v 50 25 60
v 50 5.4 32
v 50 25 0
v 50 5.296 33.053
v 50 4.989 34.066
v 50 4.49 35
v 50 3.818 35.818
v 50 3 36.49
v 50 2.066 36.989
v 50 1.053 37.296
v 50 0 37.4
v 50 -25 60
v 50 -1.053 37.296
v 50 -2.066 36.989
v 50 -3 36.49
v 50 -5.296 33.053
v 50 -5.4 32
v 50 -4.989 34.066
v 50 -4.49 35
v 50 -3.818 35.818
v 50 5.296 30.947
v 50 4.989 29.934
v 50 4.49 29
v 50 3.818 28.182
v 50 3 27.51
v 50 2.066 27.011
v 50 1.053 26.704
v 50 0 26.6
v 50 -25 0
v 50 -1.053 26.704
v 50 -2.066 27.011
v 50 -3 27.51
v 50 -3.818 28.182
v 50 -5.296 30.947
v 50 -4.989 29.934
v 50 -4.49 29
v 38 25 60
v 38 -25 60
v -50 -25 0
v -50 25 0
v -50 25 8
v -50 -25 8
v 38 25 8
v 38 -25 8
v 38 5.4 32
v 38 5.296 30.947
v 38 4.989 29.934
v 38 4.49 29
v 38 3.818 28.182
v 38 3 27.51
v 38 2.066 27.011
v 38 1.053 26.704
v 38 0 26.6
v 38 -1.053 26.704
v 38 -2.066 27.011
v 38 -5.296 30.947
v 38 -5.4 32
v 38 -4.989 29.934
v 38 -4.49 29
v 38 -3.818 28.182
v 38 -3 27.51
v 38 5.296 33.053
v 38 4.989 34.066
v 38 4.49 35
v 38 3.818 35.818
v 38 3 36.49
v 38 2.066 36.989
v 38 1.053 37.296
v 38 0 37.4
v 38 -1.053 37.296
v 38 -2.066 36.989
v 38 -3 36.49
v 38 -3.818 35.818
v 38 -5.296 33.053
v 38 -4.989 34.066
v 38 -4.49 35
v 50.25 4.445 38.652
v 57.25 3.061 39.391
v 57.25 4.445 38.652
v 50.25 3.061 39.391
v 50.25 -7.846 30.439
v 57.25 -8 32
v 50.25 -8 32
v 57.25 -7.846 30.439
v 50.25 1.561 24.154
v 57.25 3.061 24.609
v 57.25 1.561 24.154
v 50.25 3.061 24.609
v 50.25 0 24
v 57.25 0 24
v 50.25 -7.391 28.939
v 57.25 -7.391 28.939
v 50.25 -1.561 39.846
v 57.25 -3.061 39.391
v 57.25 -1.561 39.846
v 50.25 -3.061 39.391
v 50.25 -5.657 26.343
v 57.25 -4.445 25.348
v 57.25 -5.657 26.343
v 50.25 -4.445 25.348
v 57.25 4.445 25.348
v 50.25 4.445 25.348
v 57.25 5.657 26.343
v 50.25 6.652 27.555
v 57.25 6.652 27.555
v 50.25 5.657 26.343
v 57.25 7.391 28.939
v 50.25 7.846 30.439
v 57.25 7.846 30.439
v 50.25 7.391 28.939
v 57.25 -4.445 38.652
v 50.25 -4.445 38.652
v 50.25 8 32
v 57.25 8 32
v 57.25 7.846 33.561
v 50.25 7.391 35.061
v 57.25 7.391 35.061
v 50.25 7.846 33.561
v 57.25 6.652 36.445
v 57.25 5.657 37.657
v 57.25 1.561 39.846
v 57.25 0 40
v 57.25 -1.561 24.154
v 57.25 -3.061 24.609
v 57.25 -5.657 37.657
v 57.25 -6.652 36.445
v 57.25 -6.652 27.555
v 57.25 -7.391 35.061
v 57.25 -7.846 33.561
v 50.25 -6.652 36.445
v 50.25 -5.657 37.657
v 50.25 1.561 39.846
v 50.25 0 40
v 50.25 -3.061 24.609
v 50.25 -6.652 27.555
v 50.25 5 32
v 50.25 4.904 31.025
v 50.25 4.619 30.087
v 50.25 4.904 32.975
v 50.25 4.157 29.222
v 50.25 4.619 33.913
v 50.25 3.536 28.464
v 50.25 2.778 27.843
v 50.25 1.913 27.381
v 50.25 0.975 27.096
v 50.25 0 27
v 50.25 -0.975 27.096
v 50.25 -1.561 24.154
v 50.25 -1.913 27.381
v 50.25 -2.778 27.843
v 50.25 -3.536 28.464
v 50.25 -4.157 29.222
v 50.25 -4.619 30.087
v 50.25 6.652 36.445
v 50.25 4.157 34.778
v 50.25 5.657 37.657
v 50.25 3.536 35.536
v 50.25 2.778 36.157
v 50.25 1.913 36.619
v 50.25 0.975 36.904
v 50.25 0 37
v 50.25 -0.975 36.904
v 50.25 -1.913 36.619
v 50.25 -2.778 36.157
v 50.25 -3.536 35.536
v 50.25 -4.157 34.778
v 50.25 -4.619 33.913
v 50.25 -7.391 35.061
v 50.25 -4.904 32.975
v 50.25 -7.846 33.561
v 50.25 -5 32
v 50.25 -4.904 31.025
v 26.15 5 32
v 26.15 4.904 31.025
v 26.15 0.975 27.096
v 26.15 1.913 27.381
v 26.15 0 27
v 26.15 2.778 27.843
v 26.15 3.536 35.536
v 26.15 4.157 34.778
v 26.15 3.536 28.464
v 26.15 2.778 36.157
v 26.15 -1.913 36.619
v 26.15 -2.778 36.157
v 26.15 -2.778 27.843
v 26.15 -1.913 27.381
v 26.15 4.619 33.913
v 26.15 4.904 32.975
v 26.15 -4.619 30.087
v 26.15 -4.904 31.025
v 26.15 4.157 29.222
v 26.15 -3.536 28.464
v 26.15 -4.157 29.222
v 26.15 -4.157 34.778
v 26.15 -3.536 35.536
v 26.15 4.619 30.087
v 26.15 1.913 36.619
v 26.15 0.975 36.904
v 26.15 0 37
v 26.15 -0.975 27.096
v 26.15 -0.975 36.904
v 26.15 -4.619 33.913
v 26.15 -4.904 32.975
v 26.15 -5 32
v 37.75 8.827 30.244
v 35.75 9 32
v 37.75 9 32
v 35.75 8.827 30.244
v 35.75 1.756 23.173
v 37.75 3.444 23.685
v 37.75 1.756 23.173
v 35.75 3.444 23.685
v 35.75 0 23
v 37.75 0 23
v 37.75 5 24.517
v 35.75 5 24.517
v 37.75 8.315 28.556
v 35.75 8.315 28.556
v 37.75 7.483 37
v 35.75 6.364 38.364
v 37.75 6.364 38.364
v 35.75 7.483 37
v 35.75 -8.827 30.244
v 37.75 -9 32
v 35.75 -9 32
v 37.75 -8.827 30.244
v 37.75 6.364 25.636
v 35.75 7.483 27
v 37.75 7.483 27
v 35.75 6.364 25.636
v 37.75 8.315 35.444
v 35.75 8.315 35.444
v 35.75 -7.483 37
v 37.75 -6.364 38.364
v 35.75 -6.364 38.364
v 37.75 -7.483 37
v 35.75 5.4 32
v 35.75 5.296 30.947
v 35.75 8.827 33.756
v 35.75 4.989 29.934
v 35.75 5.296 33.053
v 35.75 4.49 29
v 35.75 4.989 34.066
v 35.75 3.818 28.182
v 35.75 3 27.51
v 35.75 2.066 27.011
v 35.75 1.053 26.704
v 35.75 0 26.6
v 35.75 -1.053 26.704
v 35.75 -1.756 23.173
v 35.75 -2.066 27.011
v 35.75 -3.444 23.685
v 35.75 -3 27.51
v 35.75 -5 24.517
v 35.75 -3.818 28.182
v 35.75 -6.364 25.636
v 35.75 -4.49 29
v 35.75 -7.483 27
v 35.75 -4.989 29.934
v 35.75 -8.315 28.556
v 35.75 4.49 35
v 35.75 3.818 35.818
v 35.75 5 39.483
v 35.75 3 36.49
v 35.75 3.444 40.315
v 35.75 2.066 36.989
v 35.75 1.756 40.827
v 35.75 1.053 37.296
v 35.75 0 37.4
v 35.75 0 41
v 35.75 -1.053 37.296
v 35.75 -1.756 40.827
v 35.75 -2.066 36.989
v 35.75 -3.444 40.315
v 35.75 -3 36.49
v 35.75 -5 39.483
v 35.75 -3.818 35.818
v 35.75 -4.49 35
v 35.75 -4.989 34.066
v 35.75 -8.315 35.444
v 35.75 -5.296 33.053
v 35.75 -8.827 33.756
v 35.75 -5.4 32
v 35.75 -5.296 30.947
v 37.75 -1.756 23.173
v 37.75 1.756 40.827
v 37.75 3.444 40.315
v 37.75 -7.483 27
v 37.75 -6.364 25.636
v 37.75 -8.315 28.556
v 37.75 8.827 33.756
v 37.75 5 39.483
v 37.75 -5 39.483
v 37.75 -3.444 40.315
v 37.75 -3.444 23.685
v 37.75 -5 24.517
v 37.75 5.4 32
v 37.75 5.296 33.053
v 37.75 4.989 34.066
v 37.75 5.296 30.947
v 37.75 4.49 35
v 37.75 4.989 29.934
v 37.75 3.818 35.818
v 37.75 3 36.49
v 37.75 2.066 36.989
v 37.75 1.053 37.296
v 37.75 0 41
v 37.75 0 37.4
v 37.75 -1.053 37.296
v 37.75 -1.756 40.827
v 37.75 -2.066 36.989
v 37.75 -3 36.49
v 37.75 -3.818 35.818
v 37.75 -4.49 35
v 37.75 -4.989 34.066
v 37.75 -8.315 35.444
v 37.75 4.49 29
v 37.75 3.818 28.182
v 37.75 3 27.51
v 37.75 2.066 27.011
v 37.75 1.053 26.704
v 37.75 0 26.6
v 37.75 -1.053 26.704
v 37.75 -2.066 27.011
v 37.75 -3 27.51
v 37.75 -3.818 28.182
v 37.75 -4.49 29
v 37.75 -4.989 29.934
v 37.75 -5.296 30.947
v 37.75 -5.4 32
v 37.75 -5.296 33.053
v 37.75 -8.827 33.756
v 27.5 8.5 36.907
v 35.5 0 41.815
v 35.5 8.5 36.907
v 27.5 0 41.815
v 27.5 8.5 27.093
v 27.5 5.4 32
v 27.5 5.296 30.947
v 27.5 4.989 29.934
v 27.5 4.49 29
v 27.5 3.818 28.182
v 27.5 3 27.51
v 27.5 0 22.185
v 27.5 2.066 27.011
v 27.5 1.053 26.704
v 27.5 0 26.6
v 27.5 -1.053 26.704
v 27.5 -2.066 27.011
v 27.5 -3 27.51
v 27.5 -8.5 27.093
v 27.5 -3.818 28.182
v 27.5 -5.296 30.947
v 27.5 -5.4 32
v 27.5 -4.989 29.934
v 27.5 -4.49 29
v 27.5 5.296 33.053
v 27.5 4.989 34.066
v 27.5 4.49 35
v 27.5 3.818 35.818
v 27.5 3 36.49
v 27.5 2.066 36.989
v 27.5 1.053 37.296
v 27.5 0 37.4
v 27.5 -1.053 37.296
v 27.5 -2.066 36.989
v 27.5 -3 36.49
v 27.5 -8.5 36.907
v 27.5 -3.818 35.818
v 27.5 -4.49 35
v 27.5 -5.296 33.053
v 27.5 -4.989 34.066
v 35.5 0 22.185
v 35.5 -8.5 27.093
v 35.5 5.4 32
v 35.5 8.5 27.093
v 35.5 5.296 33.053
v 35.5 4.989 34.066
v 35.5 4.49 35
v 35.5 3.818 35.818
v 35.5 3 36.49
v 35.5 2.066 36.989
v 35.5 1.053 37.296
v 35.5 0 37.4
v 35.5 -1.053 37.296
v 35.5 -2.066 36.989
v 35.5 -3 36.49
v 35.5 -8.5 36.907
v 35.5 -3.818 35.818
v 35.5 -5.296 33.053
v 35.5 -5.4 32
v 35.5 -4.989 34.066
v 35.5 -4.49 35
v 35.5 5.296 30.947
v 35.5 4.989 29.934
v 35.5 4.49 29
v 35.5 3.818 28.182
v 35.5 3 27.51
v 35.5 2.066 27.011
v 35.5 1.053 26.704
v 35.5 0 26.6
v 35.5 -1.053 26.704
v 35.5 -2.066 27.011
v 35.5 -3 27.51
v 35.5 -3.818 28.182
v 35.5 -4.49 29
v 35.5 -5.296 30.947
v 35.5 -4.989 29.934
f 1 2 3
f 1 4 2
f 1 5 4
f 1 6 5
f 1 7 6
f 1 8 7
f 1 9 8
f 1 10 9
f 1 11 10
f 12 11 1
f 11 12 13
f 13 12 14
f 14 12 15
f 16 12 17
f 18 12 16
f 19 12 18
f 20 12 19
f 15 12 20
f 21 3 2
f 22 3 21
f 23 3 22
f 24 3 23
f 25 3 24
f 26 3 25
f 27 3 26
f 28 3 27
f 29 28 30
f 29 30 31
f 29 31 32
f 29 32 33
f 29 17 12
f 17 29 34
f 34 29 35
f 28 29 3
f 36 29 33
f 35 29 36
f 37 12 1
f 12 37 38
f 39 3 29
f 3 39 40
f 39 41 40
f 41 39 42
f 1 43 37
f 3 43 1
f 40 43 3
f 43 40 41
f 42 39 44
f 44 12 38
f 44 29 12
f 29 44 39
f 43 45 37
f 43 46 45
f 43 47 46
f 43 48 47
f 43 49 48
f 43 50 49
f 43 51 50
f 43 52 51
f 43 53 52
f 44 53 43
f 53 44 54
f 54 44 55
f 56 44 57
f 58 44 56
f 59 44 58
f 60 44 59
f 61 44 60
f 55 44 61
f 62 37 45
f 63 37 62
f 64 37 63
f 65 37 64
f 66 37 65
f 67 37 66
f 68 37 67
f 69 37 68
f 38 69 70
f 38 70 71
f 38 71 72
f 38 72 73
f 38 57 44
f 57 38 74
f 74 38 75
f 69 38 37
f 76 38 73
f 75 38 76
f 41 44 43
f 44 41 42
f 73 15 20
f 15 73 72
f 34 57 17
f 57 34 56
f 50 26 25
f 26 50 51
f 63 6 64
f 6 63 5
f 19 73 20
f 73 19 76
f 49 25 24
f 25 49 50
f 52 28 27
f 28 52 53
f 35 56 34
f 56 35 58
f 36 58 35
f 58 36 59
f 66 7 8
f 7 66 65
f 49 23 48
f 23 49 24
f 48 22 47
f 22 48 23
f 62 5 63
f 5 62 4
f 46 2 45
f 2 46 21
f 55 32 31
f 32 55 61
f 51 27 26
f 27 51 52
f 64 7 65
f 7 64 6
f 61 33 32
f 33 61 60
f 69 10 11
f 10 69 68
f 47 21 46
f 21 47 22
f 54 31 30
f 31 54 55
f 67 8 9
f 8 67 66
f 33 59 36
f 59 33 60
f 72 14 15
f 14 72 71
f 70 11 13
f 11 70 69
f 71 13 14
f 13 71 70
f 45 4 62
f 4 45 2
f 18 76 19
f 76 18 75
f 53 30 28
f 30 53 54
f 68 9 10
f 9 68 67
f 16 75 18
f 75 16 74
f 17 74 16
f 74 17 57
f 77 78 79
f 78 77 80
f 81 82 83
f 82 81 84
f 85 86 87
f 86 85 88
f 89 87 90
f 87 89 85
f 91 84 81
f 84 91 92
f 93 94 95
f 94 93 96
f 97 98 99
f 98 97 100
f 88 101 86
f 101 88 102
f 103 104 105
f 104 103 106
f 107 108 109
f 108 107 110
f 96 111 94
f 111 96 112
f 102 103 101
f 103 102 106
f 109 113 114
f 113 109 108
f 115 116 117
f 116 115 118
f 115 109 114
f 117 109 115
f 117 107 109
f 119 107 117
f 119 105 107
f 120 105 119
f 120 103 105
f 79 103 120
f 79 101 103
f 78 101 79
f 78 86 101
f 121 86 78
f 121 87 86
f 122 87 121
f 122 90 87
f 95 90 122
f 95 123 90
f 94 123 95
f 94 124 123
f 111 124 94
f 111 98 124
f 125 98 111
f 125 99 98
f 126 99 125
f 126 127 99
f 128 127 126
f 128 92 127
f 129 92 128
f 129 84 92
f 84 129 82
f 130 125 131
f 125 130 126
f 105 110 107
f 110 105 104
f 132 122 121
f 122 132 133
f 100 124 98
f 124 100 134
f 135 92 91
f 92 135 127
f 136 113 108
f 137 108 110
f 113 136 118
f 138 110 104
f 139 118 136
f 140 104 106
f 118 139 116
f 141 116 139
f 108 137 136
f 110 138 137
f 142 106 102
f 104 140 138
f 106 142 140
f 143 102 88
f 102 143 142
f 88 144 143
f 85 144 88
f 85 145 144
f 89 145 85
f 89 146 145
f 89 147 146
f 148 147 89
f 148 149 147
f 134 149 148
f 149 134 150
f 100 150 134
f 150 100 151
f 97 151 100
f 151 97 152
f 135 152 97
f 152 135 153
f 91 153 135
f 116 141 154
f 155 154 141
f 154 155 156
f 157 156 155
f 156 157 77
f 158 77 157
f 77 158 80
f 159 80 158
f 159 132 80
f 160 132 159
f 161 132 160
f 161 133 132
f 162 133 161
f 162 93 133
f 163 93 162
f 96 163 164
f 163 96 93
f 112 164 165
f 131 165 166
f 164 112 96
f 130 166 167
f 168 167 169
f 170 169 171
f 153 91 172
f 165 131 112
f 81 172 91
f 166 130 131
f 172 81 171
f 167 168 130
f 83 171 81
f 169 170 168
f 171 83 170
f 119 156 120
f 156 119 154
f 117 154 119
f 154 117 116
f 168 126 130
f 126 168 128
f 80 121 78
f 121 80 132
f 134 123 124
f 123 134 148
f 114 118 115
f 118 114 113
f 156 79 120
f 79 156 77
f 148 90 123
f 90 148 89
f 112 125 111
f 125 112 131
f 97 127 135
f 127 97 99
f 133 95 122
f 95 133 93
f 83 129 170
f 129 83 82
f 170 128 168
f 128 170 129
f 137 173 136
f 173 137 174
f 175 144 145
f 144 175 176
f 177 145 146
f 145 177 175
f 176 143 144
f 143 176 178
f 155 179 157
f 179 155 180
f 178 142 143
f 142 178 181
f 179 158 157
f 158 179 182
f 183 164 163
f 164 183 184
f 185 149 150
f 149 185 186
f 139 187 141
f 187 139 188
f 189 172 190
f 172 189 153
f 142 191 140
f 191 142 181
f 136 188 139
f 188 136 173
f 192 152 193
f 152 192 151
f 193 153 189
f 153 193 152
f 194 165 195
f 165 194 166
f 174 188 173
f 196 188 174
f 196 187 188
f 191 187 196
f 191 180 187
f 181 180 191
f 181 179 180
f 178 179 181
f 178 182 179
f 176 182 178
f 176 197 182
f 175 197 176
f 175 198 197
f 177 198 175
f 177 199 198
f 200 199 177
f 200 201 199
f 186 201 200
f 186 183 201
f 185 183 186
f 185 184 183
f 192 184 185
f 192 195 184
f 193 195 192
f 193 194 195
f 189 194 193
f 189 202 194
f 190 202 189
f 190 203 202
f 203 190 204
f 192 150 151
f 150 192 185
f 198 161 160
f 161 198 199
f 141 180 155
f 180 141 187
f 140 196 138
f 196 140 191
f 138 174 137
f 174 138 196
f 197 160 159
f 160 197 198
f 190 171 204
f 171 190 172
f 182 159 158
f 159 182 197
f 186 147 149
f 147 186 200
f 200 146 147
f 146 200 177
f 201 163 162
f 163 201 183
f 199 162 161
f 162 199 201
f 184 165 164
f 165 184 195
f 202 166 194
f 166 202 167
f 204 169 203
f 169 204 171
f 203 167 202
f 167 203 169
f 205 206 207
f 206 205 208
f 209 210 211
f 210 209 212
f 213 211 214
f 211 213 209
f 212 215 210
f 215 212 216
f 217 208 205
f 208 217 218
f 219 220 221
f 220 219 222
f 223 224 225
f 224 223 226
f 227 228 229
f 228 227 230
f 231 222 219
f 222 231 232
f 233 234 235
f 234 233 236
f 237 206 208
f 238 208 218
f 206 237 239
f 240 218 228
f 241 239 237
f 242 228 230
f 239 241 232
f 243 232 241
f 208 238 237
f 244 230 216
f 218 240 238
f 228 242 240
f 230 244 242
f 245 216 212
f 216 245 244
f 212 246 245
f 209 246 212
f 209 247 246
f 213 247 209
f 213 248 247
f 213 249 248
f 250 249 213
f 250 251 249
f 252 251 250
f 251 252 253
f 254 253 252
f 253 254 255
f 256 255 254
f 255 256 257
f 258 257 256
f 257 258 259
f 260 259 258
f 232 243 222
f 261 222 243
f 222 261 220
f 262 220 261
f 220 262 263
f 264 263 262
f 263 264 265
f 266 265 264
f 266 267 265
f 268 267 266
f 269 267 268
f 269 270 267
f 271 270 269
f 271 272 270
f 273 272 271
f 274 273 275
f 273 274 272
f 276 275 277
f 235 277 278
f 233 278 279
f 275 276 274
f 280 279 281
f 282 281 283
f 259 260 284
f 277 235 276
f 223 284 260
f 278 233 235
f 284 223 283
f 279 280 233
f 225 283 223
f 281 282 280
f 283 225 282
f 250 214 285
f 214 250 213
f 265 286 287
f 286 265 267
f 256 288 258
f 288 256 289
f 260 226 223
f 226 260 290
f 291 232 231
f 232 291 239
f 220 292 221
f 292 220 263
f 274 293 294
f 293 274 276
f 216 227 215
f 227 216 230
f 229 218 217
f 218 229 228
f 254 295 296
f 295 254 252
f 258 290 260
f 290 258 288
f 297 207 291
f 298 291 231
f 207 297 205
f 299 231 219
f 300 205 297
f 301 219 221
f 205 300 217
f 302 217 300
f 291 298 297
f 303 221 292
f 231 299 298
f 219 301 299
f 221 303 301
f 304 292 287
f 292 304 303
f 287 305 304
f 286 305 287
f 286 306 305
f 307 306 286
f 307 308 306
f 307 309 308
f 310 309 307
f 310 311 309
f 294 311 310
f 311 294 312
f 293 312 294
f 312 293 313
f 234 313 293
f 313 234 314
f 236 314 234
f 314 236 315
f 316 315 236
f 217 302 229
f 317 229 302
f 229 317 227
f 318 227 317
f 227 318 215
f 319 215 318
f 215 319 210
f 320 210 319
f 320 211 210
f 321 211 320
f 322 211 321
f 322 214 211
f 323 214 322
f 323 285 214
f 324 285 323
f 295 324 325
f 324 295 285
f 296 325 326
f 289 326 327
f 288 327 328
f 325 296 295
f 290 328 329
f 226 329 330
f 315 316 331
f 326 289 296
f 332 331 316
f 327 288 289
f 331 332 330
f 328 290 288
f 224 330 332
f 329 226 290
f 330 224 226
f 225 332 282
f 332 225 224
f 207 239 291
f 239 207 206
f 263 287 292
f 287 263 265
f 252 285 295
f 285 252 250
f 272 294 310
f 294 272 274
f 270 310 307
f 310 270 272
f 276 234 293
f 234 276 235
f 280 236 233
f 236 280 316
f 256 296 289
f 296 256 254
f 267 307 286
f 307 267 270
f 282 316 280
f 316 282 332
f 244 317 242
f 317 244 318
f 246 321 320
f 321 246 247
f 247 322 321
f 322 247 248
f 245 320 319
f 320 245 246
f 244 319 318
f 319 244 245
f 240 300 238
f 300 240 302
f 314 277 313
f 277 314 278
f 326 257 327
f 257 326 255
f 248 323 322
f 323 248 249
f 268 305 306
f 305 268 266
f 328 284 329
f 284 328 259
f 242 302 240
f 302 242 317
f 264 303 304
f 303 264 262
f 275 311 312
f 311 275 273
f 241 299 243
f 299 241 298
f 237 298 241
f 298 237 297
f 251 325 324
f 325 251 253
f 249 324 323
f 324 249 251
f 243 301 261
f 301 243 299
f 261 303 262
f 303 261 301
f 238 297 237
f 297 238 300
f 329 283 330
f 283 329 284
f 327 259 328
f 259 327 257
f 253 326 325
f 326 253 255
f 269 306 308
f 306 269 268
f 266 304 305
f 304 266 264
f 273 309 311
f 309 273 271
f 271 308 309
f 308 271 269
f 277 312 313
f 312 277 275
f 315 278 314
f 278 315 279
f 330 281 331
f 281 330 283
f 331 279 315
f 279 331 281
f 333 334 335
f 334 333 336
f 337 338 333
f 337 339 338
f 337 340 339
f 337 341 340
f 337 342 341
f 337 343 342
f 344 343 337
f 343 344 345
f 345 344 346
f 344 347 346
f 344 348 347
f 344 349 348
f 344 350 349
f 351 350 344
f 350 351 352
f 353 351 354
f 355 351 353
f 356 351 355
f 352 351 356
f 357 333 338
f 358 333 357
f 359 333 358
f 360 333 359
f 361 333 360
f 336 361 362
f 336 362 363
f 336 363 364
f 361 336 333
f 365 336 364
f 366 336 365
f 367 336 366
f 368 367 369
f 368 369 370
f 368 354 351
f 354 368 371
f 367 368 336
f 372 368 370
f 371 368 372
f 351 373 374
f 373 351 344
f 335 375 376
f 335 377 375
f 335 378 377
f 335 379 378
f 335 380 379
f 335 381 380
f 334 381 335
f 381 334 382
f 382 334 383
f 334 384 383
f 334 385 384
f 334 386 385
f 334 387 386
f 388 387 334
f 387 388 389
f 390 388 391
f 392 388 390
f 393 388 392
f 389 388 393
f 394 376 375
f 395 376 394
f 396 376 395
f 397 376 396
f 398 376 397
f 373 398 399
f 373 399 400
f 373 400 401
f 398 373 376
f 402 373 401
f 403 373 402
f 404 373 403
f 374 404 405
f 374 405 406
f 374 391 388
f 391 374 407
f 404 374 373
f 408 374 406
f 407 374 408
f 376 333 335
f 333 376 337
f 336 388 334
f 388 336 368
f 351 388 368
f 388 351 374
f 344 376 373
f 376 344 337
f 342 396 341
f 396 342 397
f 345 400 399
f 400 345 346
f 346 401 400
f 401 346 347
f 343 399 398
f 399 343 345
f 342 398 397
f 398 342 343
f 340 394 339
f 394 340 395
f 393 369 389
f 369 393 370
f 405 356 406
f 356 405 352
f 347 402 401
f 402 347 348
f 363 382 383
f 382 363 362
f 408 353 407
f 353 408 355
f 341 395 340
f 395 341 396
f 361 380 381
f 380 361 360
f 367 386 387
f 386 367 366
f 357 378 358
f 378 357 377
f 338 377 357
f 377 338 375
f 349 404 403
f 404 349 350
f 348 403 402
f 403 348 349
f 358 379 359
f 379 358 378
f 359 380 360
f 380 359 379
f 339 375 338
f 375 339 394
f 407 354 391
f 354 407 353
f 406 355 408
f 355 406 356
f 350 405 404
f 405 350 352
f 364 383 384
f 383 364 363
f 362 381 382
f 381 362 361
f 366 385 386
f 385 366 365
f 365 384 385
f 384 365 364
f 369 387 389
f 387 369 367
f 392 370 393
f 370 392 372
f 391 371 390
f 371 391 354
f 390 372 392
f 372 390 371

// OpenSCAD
$fn = 32;

// ------------------------------------------------------------------------
// Bolted bracket: 100 x 50 mm bracket with 1 bolt joints
// Every part is its own module, assembly() places them once.
// ------------------------------------------------------------------------

// --- part 1 ---
module bracket() {
  difference() {
    translate([-50, -25, 0]) cube([100, 50, 60]);
    translate([-51, -26, 8]) cube([89, 52, 53]);
    translate([44, 0, 32]) rotate([0, 90, 0]) cylinder(h = 14, d = 10.8, center = true);
  }
}

// --- part 2 ---
module bolt() {
  cylinder(h = 7, d = 16);
  translate([0, 0, -24.1]) cylinder(h = 24.1, d = 10);
}

// --- part 3 ---
module washer() {
  difference() {
      translate([0, 0, 0]) cylinder(h = 2, d = 18);
      translate([0, 0, -1]) cylinder(h = 4, d = 10.8);
    }
}

// --- part 4 ---
module nut() {
  difference() {
    linear_extrude(height = 8) polygon(points = [[9.815, 0], [4.907, 8.5], [-4.907, 8.5], [-9.815, 0], [-4.907, -8.5], [4.907, -8.5]]);
    translate([0, 0, -1]) cylinder(h = 10, d = 10.8);
  }
}

// --- assembly ---
module assembly() {
  translate([0, 0, 0]) rotate([0, 0, 0]) bracket();
  translate([50.25, 0, 32]) rotate([0, 90, 0]) bolt();
  translate([35.75, 0, 32]) rotate([0, 90, 0]) washer();
  translate([27.5, 0, 32]) rotate([0, 90, 0]) nut();
}

assembly();
